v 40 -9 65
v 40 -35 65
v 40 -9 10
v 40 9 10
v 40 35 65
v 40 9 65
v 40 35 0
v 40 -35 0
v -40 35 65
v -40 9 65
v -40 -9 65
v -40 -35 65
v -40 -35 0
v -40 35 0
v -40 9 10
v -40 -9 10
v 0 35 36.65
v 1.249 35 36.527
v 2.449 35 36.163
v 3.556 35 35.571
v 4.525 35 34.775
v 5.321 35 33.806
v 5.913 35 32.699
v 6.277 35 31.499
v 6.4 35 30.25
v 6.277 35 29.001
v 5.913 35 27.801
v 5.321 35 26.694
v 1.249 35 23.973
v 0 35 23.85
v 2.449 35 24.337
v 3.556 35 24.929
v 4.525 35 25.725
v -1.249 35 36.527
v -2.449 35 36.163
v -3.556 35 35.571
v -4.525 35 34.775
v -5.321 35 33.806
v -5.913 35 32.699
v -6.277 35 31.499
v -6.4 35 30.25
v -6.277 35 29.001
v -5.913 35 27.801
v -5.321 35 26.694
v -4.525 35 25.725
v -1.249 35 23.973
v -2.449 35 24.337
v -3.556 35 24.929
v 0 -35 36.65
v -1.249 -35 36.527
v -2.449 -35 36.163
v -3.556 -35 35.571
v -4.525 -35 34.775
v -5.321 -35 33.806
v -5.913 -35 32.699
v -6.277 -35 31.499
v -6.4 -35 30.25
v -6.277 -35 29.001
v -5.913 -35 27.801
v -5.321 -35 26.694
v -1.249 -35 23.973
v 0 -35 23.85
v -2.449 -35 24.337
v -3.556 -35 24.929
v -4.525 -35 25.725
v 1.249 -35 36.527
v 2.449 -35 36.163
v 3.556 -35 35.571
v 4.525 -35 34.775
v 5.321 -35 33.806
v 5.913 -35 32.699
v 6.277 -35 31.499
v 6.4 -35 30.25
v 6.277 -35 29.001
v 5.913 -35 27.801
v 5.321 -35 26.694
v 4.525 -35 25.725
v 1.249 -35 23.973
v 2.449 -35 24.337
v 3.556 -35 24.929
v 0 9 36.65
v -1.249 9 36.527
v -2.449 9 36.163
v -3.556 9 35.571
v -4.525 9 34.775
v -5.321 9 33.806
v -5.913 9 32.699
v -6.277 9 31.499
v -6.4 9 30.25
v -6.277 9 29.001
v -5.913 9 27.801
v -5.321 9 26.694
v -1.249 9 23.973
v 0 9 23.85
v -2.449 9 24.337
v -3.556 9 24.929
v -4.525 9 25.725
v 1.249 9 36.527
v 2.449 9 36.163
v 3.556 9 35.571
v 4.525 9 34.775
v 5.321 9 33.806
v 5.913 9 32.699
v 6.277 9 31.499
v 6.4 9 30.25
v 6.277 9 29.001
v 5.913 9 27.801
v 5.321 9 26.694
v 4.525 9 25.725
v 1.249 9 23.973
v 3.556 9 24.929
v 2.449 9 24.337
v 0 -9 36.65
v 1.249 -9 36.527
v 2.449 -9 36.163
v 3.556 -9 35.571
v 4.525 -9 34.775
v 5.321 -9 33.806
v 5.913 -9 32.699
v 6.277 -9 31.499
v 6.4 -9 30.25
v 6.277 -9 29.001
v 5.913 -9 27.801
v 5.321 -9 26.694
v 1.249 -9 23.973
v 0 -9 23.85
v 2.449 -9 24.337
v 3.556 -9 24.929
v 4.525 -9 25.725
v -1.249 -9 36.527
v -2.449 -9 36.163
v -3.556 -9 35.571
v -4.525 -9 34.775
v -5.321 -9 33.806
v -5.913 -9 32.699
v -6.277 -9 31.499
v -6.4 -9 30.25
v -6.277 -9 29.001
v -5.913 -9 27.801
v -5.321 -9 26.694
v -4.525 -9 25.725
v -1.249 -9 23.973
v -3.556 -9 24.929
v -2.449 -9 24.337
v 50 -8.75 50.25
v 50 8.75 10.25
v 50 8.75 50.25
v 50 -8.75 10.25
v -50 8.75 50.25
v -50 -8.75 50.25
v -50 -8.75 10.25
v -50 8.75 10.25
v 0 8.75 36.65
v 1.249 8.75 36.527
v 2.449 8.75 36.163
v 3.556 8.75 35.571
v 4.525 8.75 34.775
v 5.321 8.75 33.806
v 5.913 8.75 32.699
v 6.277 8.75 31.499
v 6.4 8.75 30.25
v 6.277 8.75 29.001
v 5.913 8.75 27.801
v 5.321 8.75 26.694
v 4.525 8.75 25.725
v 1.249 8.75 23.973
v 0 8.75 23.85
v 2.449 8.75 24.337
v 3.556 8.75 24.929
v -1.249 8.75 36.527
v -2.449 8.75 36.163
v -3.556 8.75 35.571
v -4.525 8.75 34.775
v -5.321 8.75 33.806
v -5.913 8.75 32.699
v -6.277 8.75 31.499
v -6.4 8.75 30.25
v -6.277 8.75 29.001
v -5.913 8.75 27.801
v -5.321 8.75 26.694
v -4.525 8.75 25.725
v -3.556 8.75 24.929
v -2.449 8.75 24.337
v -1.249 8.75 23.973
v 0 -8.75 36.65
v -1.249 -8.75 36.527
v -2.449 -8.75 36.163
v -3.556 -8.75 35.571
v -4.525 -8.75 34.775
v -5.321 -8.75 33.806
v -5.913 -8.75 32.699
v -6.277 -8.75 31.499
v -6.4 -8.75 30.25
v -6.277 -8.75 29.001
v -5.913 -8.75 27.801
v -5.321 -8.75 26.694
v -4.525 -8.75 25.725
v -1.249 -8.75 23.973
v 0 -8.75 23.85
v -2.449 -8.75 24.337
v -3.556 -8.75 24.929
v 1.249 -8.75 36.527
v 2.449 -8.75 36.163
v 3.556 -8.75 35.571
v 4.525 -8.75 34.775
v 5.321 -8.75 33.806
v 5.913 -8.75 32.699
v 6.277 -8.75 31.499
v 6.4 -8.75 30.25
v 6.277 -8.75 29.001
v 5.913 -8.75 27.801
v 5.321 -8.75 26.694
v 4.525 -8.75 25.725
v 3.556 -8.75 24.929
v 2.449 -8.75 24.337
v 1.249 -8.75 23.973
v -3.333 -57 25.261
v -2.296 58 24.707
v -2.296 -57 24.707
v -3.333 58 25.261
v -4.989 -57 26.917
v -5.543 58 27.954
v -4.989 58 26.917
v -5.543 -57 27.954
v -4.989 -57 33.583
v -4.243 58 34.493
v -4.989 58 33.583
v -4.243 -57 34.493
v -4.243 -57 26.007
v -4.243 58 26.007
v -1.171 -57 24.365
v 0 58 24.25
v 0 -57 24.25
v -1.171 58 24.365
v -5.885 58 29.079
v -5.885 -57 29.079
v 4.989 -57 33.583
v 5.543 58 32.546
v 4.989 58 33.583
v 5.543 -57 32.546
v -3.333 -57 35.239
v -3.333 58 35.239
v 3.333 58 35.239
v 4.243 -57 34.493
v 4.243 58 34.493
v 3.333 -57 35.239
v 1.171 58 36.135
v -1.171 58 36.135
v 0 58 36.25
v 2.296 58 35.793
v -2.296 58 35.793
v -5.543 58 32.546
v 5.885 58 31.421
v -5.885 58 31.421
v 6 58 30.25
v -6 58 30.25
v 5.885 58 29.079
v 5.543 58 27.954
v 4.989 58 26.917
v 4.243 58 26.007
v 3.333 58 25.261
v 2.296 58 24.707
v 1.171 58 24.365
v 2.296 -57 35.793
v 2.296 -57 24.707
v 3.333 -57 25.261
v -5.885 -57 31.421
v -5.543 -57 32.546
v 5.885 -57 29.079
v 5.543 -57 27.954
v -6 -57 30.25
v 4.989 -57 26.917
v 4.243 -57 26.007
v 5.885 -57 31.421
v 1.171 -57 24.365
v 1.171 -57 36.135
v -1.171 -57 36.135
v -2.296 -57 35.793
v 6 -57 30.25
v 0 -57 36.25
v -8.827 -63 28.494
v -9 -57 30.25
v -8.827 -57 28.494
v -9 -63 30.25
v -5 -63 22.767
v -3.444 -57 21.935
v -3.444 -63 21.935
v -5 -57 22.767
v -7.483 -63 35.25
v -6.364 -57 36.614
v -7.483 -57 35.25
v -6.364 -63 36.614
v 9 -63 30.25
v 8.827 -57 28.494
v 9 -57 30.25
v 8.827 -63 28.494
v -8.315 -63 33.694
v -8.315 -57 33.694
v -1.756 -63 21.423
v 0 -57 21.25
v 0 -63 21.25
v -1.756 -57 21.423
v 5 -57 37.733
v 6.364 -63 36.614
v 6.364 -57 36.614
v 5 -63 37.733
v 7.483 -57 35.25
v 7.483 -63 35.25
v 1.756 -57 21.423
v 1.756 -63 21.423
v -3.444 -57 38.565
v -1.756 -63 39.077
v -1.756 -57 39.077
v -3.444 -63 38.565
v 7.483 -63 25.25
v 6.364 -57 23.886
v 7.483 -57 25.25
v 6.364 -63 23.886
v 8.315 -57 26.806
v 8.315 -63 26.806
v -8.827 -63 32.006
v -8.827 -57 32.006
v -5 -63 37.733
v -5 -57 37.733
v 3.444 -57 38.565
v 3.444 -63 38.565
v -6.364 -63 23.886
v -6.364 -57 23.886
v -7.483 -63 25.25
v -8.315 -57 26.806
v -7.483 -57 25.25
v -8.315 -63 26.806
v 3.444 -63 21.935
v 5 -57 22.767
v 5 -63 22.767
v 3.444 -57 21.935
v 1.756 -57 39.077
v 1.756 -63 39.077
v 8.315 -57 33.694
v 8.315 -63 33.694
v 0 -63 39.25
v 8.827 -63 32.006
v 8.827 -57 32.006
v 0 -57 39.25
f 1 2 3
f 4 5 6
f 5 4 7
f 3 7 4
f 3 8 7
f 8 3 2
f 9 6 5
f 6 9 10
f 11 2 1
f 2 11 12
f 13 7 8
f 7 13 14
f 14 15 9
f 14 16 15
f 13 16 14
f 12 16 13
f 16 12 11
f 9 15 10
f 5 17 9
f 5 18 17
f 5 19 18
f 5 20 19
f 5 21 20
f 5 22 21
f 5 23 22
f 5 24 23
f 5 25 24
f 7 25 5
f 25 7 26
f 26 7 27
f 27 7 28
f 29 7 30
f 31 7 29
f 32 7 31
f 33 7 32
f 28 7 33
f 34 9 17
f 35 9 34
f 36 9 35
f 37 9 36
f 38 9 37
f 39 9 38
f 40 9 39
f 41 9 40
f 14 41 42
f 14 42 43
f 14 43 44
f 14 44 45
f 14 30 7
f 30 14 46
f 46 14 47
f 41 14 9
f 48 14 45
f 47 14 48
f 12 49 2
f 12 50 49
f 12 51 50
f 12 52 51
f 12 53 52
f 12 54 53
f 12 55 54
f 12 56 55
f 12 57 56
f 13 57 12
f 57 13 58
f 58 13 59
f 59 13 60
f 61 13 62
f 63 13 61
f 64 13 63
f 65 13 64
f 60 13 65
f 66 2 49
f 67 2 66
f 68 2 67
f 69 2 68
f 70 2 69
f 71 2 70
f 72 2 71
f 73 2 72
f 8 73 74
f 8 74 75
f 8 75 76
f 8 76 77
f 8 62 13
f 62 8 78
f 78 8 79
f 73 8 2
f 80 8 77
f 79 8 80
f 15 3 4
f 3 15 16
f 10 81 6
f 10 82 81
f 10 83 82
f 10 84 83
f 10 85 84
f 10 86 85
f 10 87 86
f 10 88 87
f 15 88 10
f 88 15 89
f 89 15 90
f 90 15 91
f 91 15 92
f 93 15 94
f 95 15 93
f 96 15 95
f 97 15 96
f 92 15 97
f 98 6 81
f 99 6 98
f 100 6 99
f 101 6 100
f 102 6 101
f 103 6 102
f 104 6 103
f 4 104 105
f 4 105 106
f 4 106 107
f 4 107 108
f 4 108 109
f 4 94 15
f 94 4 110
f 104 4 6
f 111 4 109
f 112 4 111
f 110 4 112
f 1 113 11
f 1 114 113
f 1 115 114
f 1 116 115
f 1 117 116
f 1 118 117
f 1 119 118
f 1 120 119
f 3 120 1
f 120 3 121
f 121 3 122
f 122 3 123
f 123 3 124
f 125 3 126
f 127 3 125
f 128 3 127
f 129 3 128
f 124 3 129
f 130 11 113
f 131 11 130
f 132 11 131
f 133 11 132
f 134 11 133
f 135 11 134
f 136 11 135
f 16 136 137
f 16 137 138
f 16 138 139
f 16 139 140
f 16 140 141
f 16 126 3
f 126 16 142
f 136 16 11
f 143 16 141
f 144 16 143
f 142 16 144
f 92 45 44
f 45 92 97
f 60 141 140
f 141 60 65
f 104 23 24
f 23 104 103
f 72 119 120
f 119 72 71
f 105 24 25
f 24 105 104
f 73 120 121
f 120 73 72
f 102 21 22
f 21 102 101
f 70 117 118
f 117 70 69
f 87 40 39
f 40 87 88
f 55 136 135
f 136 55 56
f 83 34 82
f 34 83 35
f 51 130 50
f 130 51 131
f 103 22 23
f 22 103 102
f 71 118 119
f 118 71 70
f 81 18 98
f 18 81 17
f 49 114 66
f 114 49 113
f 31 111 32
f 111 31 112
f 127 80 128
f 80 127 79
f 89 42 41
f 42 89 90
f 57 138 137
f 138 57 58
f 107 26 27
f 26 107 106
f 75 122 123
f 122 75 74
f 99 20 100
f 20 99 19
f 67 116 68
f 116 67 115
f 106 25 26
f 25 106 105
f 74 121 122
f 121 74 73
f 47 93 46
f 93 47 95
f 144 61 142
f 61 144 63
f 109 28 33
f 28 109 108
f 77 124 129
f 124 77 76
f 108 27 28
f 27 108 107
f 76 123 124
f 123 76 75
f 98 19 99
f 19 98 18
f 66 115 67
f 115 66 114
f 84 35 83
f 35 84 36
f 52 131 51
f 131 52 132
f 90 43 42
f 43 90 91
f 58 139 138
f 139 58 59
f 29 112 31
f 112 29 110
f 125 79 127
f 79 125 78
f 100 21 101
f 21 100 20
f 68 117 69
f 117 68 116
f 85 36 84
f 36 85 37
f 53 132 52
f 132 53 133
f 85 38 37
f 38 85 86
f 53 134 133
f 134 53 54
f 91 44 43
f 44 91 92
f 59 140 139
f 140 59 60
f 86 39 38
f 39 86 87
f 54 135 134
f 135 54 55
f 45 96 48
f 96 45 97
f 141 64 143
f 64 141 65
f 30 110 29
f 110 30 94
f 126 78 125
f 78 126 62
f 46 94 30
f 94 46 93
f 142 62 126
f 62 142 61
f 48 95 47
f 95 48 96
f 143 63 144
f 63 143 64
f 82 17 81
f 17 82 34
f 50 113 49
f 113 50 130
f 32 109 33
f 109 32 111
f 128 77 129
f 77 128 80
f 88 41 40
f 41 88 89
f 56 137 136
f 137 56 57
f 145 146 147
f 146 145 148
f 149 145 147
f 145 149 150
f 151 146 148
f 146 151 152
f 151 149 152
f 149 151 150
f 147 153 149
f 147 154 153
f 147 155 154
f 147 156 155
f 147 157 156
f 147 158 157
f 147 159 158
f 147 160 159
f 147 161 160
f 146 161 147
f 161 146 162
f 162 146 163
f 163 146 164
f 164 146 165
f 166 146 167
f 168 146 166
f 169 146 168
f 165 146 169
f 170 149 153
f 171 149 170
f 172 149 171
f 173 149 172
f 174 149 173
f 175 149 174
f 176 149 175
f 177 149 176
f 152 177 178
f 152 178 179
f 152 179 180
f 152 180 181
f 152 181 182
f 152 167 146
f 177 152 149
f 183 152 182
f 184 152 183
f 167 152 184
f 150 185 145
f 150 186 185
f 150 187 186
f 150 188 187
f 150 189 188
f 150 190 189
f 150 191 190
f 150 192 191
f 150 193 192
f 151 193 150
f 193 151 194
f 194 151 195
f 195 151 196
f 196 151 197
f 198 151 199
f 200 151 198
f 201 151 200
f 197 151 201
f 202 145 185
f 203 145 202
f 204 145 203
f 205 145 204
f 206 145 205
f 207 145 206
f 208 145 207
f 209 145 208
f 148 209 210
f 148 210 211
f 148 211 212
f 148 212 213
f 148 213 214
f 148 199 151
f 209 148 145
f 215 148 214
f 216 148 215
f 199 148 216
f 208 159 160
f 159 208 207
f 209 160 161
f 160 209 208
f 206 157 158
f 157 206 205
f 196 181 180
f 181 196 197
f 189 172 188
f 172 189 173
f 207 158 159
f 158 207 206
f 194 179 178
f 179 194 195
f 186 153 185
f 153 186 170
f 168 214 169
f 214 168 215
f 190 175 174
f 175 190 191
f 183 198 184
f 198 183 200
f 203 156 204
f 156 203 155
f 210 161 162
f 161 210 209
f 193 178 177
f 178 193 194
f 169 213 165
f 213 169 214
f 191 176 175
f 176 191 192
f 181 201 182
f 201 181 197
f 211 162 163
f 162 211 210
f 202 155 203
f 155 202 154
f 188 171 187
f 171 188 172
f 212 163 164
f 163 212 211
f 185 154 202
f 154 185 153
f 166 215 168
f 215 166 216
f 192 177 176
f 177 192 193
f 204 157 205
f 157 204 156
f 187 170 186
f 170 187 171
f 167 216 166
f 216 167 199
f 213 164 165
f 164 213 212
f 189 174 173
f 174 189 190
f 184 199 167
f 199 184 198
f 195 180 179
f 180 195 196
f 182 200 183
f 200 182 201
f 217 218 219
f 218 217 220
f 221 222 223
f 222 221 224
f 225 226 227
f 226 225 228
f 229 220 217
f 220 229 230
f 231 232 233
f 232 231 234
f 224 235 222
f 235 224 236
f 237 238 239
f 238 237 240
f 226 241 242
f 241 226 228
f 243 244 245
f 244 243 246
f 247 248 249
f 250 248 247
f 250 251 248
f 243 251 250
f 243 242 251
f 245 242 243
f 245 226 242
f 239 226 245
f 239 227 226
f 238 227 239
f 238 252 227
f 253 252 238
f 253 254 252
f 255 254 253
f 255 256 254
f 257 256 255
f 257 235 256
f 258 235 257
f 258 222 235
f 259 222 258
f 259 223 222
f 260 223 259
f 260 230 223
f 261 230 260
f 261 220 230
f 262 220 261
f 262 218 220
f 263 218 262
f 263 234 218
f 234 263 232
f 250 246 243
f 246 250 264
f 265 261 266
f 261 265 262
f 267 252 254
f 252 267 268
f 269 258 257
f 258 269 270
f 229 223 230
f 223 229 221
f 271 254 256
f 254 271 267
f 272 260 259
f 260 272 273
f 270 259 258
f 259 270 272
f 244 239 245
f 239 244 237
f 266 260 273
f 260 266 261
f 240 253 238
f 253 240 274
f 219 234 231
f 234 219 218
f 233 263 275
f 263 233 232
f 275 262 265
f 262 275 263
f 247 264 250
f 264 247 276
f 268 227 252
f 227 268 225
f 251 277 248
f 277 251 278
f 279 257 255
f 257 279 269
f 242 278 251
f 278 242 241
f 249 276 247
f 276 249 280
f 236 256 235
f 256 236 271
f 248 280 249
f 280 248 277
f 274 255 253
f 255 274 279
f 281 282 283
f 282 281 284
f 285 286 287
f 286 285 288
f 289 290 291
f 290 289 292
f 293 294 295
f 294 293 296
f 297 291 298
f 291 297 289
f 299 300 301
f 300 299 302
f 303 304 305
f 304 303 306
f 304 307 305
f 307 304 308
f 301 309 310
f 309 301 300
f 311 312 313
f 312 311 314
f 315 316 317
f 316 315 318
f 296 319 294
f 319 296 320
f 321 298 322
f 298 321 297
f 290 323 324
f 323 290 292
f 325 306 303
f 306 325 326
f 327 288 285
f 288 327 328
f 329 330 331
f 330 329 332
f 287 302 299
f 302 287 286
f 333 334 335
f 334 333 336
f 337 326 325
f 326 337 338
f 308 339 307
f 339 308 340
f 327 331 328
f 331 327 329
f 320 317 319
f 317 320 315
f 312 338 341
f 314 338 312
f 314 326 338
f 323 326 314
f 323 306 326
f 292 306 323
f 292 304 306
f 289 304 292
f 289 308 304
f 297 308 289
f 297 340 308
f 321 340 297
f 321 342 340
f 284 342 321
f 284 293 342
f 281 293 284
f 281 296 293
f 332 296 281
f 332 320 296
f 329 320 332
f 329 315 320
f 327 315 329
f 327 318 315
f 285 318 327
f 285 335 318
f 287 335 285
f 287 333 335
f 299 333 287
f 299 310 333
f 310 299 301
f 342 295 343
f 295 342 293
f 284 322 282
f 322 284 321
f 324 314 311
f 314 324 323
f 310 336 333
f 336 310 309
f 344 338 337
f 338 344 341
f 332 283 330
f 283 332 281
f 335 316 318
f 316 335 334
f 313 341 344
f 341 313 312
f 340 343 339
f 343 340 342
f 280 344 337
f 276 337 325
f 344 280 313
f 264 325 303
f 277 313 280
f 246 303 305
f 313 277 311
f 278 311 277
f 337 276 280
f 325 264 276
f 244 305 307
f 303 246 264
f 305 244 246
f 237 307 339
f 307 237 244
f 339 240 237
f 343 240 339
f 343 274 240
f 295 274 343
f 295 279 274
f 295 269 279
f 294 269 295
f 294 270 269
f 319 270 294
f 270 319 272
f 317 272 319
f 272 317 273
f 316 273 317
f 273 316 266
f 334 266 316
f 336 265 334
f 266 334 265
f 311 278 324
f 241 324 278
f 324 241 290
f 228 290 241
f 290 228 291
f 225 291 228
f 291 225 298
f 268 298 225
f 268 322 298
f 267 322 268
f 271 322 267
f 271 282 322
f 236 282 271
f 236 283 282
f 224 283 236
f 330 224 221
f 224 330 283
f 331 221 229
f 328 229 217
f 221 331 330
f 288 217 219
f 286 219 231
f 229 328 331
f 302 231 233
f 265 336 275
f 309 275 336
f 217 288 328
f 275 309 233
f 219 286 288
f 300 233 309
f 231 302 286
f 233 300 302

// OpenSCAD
$fn = 32;

// ------------------------------------------------------------------------
// Clevis joint: 80 mm clevis, pin d12
// Every part is its own module, assembly() places them once.
// ------------------------------------------------------------------------

// --- part 1 ---
module clevis() {
  difference() {
    translate([-40, -35, 0]) cube([80, 70, 65]);
    translate([-41, -9, 10]) cube([82, 18, 56]);
    translate([0, 0, 30.25]) rotate([90, 0, 0]) cylinder(h = 72, d = 12.8, center = true);
  }
}

// --- part 2 ---
module eye() {
  difference() {
    translate([-50, -8.75, 0]) cube([100, 17.5, 40]);
    translate([0, 0, 20]) rotate([90, 0, 0]) cylinder(h = 19.5, d = 12.8, center = true);
  }
}

// --- part 3 ---
module pin() {
  rotate([0, 90, 0]) cylinder(h = 116, d = 12, center = true);
  translate([-63, 0, 0]) rotate([0, 90, 0]) cylinder(h = 6, d = 18);
}

// --- assembly ---
module assembly() {
  translate([0, 0, 0]) rotate([0, 0, 0]) clevis();
  translate([0, 0, 10.25]) rotate([0, 0, 0]) eye();
  translate([0, 0, 30.25]) rotate([0, 0, 90]) pin();
}

assembly();
